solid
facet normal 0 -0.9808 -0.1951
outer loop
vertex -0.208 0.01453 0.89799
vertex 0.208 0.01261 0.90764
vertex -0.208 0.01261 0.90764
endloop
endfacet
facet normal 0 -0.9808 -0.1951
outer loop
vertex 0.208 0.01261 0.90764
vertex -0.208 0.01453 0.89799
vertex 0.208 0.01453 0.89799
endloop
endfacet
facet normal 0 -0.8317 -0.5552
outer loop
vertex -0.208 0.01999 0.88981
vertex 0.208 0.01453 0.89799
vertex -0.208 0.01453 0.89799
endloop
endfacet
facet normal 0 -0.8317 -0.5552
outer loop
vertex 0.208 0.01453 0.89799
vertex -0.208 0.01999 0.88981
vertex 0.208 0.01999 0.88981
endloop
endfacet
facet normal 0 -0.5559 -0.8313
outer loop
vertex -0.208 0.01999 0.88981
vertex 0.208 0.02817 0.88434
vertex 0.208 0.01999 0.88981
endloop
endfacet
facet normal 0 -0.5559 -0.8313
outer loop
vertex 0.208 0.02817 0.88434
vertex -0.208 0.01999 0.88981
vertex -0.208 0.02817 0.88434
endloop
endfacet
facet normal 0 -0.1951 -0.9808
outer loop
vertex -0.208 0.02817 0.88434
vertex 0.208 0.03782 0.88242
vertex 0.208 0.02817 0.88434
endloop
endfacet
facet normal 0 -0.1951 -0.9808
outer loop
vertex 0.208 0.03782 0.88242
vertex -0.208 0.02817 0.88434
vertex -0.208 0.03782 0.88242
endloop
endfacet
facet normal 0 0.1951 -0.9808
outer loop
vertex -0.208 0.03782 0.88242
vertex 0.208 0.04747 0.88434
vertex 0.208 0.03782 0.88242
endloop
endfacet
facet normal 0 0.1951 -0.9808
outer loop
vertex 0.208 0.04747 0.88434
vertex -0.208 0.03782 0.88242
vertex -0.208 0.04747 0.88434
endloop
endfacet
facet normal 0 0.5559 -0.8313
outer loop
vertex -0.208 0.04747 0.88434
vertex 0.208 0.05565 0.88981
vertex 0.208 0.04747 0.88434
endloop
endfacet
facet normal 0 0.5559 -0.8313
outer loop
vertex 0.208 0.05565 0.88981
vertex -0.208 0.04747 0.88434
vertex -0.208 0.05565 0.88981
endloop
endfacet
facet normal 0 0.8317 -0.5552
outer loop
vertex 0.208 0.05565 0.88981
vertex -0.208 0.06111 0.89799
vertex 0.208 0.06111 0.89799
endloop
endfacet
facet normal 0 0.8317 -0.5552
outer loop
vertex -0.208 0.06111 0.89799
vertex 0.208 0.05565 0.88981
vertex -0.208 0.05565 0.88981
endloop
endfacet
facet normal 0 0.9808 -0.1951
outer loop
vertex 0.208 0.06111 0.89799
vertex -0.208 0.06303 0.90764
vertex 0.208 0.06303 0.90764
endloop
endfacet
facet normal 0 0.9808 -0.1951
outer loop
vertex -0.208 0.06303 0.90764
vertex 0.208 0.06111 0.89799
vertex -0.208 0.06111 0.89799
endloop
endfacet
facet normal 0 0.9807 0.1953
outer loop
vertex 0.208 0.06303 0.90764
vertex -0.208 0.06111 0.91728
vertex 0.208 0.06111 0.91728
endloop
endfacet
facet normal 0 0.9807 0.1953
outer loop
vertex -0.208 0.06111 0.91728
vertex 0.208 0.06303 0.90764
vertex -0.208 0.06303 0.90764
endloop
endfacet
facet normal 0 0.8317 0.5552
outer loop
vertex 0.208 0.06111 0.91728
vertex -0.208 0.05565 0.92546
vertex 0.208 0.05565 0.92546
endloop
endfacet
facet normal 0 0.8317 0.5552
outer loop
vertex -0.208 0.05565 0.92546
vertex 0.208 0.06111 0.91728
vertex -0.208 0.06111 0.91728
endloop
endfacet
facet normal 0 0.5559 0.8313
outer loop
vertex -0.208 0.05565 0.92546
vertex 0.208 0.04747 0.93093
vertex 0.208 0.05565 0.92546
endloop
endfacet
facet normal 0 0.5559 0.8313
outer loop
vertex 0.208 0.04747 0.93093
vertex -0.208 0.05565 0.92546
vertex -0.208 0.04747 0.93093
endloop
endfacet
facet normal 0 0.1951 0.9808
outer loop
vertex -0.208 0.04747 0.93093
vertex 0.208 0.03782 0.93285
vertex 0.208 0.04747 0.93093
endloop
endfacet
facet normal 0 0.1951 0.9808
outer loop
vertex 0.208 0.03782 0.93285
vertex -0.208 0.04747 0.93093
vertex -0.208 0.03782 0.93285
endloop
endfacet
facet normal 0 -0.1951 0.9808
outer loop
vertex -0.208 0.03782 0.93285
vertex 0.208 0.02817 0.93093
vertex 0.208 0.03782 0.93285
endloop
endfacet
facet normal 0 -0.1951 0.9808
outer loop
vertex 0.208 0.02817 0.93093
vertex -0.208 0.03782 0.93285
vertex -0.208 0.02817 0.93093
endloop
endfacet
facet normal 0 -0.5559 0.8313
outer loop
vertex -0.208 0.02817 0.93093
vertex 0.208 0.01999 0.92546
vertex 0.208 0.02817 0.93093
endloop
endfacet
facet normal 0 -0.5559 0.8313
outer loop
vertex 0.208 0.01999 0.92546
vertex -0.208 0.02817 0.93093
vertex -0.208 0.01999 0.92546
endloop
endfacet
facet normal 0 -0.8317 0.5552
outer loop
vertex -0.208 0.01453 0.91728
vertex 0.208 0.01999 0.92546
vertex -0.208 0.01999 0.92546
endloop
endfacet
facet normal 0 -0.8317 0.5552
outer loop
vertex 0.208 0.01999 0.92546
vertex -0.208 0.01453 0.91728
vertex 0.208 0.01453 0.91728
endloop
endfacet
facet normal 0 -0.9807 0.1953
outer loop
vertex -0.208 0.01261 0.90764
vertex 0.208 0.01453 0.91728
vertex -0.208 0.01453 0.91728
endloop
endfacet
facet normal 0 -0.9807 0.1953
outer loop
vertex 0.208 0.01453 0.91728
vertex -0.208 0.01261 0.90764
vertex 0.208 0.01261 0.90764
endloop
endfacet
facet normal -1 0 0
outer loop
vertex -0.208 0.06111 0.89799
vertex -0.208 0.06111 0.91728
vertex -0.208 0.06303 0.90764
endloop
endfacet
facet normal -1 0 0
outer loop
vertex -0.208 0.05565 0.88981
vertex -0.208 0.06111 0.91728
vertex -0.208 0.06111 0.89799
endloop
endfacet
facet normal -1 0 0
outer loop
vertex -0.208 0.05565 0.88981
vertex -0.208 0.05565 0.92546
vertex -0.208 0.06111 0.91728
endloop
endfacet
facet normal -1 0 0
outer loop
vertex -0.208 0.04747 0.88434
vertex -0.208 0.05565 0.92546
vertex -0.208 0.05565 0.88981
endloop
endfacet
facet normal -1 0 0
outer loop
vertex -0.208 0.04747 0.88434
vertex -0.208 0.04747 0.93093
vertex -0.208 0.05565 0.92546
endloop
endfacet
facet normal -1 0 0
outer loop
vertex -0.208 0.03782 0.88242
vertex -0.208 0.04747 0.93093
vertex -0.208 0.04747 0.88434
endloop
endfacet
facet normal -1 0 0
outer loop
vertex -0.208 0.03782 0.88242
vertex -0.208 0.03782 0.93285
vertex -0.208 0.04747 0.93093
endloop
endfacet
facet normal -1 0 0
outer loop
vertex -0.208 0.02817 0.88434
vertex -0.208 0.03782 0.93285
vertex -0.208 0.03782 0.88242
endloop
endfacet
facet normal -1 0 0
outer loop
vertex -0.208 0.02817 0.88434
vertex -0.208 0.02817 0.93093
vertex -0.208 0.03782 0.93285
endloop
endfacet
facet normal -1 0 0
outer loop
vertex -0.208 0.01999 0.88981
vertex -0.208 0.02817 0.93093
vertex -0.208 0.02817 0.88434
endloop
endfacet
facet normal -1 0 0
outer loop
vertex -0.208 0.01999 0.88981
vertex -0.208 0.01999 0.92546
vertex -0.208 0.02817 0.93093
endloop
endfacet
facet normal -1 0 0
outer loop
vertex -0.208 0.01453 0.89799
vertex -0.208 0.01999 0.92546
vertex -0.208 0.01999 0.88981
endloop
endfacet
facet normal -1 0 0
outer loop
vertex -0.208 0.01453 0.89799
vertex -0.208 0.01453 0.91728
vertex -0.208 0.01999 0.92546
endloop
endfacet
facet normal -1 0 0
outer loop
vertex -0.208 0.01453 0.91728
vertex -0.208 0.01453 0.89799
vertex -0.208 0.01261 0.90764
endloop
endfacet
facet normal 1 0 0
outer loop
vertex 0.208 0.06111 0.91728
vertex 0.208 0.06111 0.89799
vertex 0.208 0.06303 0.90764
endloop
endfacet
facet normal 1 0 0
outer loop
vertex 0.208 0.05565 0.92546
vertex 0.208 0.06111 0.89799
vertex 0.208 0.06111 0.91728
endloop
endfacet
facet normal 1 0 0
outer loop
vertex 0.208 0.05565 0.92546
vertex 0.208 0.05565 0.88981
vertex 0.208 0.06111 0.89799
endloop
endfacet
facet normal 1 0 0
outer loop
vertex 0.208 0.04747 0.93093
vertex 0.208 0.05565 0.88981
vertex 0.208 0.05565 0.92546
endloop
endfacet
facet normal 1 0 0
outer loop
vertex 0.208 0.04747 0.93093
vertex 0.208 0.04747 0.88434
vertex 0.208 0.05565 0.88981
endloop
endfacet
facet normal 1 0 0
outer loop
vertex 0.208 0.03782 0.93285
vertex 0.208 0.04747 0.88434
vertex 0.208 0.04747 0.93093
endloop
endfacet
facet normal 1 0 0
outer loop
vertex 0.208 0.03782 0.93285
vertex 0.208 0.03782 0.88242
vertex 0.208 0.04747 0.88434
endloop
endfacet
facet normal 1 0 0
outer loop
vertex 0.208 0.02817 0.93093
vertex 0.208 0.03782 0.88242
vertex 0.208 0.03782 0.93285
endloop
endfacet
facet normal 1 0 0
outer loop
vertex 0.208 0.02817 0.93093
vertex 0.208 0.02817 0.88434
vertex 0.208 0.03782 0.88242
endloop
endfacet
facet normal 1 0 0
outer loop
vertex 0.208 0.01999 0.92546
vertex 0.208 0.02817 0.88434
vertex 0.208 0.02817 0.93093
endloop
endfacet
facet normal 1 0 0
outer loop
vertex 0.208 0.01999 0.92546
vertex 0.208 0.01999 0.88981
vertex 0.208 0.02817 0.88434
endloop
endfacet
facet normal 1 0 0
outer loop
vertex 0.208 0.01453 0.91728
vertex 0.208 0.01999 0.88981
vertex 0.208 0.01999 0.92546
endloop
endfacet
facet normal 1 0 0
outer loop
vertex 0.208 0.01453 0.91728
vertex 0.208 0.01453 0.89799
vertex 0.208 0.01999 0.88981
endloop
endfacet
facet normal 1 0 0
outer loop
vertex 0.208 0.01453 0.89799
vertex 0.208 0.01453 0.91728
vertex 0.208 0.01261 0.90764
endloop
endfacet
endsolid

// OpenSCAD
$fa = 1;
$fs = 0.01;
mag = 0.416/2.2;
thickness = mag * 0.4;

a = mag * 1.4 / 2.0;
b = mag * 2.6 / 2.0;
c = mag * 2.2 / 2.0;
d = mag * 2.4;
e = mag * 1.8;
f = mag * 0.6;
g = mag * 0.6;
vcenter = mag * 0;

p0 = [-a, vcenter + d + e + f];
p1 = [-a, vcenter + d + e];
p2 = [-b, vcenter + d];
p3 = [-c, vcenter + 0.0];
p4 = [c, vcenter + 0.0];
p5 = [b, vcenter + d];
p6 = [a, vcenter + d + e];
p7 = [a, vcenter + d + e + f];
points = [p0, p1, p2, p3, p4, p5, p6, p7];
rotate([-90,0,0]) {
//translate([0,-d - e - f,0])
//linear_extrude(height = thickness) {
//  polygon(points);
//}
translate([-c,-d-e-f,thickness/2])
rotate([0,90,0])
cylinder(c*2, thickness / 3, thickness / 3);
}
